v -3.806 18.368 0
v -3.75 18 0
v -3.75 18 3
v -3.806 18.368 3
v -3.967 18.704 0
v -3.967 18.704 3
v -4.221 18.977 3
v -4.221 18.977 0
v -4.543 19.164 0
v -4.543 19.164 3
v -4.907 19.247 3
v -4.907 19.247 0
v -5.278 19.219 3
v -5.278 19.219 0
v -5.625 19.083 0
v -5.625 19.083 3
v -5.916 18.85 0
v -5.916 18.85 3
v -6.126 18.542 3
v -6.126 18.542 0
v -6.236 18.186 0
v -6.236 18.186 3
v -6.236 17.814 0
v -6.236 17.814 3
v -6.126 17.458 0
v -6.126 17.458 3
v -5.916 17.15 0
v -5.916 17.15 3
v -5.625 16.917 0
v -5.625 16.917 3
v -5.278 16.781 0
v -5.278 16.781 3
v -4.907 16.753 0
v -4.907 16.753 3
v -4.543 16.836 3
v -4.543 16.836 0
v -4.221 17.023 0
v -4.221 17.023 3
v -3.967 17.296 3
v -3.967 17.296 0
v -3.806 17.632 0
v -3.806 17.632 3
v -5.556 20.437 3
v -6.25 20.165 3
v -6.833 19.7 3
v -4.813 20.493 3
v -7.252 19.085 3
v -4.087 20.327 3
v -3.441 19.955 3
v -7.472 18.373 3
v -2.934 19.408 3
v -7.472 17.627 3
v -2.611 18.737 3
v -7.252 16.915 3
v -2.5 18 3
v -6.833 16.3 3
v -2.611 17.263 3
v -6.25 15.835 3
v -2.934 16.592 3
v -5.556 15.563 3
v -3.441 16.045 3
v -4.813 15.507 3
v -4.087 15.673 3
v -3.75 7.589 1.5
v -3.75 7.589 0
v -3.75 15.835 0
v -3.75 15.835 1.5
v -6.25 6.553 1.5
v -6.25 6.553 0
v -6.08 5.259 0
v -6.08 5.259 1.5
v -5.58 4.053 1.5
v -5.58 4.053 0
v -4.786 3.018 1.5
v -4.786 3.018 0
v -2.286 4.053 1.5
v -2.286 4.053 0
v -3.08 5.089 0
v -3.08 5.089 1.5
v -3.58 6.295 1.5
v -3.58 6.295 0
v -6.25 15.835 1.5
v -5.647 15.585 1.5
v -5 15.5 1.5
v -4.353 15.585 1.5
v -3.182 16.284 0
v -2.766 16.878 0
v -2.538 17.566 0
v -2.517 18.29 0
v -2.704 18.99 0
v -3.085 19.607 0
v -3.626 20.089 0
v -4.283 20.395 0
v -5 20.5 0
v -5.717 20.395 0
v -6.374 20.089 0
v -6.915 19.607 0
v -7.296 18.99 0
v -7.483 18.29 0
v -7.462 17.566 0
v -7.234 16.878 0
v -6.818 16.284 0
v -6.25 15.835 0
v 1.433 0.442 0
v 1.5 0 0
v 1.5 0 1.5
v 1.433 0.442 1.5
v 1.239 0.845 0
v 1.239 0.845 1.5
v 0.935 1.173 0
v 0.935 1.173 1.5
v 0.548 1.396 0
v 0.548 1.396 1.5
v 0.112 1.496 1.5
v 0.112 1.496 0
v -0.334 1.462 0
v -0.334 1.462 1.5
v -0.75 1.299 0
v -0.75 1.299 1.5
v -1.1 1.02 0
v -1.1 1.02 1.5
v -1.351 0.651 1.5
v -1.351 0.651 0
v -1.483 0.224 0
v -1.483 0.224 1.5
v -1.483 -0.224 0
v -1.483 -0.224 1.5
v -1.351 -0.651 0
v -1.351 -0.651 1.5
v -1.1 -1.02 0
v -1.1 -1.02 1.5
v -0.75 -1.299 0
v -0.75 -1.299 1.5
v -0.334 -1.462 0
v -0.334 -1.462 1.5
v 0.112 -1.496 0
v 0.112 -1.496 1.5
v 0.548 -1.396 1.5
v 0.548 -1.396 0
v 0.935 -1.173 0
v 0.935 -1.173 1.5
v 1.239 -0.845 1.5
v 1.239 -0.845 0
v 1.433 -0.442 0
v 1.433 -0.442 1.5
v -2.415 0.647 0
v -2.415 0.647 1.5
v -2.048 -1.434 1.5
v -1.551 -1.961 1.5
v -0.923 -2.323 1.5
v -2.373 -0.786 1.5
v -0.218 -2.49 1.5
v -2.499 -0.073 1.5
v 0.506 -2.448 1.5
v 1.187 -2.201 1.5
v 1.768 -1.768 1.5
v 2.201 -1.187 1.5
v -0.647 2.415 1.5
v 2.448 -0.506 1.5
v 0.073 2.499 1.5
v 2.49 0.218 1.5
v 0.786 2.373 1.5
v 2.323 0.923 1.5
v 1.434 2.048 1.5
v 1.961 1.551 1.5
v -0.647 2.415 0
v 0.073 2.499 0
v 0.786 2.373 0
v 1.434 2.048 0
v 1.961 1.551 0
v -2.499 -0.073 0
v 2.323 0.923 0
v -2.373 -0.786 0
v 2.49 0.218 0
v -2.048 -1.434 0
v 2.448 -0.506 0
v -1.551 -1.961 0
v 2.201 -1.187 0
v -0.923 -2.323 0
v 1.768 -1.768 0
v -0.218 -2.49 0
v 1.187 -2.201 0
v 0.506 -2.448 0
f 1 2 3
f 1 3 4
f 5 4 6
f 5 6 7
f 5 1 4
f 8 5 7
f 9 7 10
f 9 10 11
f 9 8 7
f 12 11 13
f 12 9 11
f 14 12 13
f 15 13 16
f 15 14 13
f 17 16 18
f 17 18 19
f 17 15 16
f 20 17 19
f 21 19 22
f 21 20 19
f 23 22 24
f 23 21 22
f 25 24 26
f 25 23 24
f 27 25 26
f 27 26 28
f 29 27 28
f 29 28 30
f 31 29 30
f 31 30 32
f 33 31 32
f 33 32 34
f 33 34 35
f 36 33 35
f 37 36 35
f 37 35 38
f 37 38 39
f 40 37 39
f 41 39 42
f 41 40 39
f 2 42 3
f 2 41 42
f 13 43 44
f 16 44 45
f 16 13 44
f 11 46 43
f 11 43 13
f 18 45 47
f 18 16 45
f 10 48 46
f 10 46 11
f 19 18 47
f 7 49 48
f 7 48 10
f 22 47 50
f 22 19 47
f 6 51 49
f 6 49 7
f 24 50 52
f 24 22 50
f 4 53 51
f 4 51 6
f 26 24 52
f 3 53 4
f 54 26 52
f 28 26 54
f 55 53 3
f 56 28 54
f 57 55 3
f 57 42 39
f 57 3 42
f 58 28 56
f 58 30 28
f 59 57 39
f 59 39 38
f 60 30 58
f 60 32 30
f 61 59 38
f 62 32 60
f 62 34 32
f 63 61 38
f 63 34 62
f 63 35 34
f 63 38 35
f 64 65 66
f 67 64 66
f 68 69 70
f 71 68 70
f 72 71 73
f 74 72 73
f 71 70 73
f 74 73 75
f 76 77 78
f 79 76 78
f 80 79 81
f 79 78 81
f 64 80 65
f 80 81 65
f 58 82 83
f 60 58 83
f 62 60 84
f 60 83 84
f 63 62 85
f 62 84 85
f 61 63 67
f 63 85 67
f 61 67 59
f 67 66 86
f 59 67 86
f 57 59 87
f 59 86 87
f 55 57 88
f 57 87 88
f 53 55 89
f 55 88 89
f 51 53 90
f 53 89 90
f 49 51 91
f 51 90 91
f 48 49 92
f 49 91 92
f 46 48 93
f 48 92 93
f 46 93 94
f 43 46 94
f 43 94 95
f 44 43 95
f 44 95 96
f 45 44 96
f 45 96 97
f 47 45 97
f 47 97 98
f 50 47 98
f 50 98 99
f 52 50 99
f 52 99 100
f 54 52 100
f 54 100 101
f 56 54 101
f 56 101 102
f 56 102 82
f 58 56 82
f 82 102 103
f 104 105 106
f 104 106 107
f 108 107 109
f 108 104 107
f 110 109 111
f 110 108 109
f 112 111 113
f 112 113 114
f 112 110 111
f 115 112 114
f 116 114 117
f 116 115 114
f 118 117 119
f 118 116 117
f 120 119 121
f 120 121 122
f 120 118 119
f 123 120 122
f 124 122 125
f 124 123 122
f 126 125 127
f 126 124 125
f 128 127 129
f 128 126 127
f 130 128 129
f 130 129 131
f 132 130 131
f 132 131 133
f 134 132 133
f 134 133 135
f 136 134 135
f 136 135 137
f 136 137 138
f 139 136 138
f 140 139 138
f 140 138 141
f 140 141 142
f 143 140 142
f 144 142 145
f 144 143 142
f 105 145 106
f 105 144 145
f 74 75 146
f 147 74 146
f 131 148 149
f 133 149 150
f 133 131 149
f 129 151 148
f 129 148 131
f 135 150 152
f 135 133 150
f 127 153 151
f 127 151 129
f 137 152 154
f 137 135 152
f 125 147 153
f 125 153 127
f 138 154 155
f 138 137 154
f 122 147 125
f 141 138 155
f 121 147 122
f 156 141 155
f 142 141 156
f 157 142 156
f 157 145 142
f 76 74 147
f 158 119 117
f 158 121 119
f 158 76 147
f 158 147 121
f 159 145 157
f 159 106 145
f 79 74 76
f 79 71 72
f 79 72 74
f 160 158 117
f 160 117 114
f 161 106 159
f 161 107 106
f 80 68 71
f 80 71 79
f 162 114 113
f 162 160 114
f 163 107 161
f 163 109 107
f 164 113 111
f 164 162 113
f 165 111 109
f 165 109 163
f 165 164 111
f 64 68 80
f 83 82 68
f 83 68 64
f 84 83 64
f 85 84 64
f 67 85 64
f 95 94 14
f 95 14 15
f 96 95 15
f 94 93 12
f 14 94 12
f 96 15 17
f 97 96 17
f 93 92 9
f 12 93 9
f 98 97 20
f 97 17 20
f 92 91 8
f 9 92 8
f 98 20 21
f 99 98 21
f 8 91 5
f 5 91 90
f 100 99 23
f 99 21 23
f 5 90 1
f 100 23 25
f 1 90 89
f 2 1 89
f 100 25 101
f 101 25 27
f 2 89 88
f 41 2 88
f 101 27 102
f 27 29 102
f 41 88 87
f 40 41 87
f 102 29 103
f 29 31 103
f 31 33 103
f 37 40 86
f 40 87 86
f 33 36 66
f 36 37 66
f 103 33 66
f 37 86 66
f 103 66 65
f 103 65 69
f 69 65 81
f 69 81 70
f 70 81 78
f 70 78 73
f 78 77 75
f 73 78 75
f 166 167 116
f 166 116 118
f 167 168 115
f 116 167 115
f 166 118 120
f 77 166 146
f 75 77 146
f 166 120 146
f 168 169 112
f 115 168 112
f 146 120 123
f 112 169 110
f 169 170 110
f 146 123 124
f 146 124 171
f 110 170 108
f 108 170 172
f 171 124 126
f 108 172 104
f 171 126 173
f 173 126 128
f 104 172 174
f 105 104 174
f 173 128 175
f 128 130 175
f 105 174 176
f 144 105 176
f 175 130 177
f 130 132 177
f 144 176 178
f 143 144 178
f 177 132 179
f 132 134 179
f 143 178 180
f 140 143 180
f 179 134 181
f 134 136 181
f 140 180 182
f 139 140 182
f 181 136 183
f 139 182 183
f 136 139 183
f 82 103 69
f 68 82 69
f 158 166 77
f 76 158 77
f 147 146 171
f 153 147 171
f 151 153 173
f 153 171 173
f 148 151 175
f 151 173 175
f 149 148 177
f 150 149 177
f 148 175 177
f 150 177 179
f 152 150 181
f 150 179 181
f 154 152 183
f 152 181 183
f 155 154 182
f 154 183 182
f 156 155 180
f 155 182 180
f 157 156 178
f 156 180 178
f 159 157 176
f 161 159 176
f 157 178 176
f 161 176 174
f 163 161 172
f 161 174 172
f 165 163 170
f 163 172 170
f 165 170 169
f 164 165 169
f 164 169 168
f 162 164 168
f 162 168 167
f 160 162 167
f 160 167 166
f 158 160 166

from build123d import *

# Parameters (mm, degrees)
SKETCH1_R           = 1.5
BOSS_EXTRUDE1_DEPTH = 1.5
SKETCH1_3_R         = 1.25
BOSS_EXTRUDE2_DEPTH = 3


with BuildPart() as part:
    # Sketch1 → Boss-Extrude1 (new body)
    with BuildSketch(Plane.XY):
        with BuildLine():
            Line((-3.75, 7.588834765), (-3.75, 15.834936491))
            ThreePointArc((-3.75, 15.834936491), (-5, 15.5), (-6.25, 15.834936491))
            Line((-6.25, 15.834936491), (-6.25, 6.553300859))
            ThreePointArc((-6.25, 6.553300859), (-5.869397663, 4.639883697), (-4.785533906, 3.017766953))
            Line((-4.785533906, 3.017766953), (-2.414814566, 0.647047613))
            ThreePointArc((-2.414814566, 0.647047613), (1.767766953, -1.767766953), (-0.647047613, 2.414814566))
            Line((-0.647047613, 2.414814566), (-2.285533906, 4.053300859))
            ThreePointArc((-2.285533906, 4.053300859), (-3.369397663, 5.675417603), (-3.75, 7.588834765))
        make_face()
        Circle(SKETCH1_R, mode=Mode.SUBTRACT)
    extrude(amount=BOSS_EXTRUDE1_DEPTH)

    # Sketch1<3> → Boss-Extrude2 (add)
    with BuildSketch(Plane.XY):
        with BuildLine():
            ThreePointArc((-6.25, 15.834936491), (-5, 15.5), (-3.75, 15.834936491))
            ThreePointArc((-3.75, 15.834936491), (-2.834936491, 16.75), (-2.5, 18))
            ThreePointArc((-2.5, 18), (-6.25, 20.165063509), (-6.25, 15.834936491))
        make_face()
        with Locations((-5, 18)):
            Circle(SKETCH1_3_R, mode=Mode.SUBTRACT)
    extrude(amount=BOSS_EXTRUDE2_DEPTH)


solid = part.part
